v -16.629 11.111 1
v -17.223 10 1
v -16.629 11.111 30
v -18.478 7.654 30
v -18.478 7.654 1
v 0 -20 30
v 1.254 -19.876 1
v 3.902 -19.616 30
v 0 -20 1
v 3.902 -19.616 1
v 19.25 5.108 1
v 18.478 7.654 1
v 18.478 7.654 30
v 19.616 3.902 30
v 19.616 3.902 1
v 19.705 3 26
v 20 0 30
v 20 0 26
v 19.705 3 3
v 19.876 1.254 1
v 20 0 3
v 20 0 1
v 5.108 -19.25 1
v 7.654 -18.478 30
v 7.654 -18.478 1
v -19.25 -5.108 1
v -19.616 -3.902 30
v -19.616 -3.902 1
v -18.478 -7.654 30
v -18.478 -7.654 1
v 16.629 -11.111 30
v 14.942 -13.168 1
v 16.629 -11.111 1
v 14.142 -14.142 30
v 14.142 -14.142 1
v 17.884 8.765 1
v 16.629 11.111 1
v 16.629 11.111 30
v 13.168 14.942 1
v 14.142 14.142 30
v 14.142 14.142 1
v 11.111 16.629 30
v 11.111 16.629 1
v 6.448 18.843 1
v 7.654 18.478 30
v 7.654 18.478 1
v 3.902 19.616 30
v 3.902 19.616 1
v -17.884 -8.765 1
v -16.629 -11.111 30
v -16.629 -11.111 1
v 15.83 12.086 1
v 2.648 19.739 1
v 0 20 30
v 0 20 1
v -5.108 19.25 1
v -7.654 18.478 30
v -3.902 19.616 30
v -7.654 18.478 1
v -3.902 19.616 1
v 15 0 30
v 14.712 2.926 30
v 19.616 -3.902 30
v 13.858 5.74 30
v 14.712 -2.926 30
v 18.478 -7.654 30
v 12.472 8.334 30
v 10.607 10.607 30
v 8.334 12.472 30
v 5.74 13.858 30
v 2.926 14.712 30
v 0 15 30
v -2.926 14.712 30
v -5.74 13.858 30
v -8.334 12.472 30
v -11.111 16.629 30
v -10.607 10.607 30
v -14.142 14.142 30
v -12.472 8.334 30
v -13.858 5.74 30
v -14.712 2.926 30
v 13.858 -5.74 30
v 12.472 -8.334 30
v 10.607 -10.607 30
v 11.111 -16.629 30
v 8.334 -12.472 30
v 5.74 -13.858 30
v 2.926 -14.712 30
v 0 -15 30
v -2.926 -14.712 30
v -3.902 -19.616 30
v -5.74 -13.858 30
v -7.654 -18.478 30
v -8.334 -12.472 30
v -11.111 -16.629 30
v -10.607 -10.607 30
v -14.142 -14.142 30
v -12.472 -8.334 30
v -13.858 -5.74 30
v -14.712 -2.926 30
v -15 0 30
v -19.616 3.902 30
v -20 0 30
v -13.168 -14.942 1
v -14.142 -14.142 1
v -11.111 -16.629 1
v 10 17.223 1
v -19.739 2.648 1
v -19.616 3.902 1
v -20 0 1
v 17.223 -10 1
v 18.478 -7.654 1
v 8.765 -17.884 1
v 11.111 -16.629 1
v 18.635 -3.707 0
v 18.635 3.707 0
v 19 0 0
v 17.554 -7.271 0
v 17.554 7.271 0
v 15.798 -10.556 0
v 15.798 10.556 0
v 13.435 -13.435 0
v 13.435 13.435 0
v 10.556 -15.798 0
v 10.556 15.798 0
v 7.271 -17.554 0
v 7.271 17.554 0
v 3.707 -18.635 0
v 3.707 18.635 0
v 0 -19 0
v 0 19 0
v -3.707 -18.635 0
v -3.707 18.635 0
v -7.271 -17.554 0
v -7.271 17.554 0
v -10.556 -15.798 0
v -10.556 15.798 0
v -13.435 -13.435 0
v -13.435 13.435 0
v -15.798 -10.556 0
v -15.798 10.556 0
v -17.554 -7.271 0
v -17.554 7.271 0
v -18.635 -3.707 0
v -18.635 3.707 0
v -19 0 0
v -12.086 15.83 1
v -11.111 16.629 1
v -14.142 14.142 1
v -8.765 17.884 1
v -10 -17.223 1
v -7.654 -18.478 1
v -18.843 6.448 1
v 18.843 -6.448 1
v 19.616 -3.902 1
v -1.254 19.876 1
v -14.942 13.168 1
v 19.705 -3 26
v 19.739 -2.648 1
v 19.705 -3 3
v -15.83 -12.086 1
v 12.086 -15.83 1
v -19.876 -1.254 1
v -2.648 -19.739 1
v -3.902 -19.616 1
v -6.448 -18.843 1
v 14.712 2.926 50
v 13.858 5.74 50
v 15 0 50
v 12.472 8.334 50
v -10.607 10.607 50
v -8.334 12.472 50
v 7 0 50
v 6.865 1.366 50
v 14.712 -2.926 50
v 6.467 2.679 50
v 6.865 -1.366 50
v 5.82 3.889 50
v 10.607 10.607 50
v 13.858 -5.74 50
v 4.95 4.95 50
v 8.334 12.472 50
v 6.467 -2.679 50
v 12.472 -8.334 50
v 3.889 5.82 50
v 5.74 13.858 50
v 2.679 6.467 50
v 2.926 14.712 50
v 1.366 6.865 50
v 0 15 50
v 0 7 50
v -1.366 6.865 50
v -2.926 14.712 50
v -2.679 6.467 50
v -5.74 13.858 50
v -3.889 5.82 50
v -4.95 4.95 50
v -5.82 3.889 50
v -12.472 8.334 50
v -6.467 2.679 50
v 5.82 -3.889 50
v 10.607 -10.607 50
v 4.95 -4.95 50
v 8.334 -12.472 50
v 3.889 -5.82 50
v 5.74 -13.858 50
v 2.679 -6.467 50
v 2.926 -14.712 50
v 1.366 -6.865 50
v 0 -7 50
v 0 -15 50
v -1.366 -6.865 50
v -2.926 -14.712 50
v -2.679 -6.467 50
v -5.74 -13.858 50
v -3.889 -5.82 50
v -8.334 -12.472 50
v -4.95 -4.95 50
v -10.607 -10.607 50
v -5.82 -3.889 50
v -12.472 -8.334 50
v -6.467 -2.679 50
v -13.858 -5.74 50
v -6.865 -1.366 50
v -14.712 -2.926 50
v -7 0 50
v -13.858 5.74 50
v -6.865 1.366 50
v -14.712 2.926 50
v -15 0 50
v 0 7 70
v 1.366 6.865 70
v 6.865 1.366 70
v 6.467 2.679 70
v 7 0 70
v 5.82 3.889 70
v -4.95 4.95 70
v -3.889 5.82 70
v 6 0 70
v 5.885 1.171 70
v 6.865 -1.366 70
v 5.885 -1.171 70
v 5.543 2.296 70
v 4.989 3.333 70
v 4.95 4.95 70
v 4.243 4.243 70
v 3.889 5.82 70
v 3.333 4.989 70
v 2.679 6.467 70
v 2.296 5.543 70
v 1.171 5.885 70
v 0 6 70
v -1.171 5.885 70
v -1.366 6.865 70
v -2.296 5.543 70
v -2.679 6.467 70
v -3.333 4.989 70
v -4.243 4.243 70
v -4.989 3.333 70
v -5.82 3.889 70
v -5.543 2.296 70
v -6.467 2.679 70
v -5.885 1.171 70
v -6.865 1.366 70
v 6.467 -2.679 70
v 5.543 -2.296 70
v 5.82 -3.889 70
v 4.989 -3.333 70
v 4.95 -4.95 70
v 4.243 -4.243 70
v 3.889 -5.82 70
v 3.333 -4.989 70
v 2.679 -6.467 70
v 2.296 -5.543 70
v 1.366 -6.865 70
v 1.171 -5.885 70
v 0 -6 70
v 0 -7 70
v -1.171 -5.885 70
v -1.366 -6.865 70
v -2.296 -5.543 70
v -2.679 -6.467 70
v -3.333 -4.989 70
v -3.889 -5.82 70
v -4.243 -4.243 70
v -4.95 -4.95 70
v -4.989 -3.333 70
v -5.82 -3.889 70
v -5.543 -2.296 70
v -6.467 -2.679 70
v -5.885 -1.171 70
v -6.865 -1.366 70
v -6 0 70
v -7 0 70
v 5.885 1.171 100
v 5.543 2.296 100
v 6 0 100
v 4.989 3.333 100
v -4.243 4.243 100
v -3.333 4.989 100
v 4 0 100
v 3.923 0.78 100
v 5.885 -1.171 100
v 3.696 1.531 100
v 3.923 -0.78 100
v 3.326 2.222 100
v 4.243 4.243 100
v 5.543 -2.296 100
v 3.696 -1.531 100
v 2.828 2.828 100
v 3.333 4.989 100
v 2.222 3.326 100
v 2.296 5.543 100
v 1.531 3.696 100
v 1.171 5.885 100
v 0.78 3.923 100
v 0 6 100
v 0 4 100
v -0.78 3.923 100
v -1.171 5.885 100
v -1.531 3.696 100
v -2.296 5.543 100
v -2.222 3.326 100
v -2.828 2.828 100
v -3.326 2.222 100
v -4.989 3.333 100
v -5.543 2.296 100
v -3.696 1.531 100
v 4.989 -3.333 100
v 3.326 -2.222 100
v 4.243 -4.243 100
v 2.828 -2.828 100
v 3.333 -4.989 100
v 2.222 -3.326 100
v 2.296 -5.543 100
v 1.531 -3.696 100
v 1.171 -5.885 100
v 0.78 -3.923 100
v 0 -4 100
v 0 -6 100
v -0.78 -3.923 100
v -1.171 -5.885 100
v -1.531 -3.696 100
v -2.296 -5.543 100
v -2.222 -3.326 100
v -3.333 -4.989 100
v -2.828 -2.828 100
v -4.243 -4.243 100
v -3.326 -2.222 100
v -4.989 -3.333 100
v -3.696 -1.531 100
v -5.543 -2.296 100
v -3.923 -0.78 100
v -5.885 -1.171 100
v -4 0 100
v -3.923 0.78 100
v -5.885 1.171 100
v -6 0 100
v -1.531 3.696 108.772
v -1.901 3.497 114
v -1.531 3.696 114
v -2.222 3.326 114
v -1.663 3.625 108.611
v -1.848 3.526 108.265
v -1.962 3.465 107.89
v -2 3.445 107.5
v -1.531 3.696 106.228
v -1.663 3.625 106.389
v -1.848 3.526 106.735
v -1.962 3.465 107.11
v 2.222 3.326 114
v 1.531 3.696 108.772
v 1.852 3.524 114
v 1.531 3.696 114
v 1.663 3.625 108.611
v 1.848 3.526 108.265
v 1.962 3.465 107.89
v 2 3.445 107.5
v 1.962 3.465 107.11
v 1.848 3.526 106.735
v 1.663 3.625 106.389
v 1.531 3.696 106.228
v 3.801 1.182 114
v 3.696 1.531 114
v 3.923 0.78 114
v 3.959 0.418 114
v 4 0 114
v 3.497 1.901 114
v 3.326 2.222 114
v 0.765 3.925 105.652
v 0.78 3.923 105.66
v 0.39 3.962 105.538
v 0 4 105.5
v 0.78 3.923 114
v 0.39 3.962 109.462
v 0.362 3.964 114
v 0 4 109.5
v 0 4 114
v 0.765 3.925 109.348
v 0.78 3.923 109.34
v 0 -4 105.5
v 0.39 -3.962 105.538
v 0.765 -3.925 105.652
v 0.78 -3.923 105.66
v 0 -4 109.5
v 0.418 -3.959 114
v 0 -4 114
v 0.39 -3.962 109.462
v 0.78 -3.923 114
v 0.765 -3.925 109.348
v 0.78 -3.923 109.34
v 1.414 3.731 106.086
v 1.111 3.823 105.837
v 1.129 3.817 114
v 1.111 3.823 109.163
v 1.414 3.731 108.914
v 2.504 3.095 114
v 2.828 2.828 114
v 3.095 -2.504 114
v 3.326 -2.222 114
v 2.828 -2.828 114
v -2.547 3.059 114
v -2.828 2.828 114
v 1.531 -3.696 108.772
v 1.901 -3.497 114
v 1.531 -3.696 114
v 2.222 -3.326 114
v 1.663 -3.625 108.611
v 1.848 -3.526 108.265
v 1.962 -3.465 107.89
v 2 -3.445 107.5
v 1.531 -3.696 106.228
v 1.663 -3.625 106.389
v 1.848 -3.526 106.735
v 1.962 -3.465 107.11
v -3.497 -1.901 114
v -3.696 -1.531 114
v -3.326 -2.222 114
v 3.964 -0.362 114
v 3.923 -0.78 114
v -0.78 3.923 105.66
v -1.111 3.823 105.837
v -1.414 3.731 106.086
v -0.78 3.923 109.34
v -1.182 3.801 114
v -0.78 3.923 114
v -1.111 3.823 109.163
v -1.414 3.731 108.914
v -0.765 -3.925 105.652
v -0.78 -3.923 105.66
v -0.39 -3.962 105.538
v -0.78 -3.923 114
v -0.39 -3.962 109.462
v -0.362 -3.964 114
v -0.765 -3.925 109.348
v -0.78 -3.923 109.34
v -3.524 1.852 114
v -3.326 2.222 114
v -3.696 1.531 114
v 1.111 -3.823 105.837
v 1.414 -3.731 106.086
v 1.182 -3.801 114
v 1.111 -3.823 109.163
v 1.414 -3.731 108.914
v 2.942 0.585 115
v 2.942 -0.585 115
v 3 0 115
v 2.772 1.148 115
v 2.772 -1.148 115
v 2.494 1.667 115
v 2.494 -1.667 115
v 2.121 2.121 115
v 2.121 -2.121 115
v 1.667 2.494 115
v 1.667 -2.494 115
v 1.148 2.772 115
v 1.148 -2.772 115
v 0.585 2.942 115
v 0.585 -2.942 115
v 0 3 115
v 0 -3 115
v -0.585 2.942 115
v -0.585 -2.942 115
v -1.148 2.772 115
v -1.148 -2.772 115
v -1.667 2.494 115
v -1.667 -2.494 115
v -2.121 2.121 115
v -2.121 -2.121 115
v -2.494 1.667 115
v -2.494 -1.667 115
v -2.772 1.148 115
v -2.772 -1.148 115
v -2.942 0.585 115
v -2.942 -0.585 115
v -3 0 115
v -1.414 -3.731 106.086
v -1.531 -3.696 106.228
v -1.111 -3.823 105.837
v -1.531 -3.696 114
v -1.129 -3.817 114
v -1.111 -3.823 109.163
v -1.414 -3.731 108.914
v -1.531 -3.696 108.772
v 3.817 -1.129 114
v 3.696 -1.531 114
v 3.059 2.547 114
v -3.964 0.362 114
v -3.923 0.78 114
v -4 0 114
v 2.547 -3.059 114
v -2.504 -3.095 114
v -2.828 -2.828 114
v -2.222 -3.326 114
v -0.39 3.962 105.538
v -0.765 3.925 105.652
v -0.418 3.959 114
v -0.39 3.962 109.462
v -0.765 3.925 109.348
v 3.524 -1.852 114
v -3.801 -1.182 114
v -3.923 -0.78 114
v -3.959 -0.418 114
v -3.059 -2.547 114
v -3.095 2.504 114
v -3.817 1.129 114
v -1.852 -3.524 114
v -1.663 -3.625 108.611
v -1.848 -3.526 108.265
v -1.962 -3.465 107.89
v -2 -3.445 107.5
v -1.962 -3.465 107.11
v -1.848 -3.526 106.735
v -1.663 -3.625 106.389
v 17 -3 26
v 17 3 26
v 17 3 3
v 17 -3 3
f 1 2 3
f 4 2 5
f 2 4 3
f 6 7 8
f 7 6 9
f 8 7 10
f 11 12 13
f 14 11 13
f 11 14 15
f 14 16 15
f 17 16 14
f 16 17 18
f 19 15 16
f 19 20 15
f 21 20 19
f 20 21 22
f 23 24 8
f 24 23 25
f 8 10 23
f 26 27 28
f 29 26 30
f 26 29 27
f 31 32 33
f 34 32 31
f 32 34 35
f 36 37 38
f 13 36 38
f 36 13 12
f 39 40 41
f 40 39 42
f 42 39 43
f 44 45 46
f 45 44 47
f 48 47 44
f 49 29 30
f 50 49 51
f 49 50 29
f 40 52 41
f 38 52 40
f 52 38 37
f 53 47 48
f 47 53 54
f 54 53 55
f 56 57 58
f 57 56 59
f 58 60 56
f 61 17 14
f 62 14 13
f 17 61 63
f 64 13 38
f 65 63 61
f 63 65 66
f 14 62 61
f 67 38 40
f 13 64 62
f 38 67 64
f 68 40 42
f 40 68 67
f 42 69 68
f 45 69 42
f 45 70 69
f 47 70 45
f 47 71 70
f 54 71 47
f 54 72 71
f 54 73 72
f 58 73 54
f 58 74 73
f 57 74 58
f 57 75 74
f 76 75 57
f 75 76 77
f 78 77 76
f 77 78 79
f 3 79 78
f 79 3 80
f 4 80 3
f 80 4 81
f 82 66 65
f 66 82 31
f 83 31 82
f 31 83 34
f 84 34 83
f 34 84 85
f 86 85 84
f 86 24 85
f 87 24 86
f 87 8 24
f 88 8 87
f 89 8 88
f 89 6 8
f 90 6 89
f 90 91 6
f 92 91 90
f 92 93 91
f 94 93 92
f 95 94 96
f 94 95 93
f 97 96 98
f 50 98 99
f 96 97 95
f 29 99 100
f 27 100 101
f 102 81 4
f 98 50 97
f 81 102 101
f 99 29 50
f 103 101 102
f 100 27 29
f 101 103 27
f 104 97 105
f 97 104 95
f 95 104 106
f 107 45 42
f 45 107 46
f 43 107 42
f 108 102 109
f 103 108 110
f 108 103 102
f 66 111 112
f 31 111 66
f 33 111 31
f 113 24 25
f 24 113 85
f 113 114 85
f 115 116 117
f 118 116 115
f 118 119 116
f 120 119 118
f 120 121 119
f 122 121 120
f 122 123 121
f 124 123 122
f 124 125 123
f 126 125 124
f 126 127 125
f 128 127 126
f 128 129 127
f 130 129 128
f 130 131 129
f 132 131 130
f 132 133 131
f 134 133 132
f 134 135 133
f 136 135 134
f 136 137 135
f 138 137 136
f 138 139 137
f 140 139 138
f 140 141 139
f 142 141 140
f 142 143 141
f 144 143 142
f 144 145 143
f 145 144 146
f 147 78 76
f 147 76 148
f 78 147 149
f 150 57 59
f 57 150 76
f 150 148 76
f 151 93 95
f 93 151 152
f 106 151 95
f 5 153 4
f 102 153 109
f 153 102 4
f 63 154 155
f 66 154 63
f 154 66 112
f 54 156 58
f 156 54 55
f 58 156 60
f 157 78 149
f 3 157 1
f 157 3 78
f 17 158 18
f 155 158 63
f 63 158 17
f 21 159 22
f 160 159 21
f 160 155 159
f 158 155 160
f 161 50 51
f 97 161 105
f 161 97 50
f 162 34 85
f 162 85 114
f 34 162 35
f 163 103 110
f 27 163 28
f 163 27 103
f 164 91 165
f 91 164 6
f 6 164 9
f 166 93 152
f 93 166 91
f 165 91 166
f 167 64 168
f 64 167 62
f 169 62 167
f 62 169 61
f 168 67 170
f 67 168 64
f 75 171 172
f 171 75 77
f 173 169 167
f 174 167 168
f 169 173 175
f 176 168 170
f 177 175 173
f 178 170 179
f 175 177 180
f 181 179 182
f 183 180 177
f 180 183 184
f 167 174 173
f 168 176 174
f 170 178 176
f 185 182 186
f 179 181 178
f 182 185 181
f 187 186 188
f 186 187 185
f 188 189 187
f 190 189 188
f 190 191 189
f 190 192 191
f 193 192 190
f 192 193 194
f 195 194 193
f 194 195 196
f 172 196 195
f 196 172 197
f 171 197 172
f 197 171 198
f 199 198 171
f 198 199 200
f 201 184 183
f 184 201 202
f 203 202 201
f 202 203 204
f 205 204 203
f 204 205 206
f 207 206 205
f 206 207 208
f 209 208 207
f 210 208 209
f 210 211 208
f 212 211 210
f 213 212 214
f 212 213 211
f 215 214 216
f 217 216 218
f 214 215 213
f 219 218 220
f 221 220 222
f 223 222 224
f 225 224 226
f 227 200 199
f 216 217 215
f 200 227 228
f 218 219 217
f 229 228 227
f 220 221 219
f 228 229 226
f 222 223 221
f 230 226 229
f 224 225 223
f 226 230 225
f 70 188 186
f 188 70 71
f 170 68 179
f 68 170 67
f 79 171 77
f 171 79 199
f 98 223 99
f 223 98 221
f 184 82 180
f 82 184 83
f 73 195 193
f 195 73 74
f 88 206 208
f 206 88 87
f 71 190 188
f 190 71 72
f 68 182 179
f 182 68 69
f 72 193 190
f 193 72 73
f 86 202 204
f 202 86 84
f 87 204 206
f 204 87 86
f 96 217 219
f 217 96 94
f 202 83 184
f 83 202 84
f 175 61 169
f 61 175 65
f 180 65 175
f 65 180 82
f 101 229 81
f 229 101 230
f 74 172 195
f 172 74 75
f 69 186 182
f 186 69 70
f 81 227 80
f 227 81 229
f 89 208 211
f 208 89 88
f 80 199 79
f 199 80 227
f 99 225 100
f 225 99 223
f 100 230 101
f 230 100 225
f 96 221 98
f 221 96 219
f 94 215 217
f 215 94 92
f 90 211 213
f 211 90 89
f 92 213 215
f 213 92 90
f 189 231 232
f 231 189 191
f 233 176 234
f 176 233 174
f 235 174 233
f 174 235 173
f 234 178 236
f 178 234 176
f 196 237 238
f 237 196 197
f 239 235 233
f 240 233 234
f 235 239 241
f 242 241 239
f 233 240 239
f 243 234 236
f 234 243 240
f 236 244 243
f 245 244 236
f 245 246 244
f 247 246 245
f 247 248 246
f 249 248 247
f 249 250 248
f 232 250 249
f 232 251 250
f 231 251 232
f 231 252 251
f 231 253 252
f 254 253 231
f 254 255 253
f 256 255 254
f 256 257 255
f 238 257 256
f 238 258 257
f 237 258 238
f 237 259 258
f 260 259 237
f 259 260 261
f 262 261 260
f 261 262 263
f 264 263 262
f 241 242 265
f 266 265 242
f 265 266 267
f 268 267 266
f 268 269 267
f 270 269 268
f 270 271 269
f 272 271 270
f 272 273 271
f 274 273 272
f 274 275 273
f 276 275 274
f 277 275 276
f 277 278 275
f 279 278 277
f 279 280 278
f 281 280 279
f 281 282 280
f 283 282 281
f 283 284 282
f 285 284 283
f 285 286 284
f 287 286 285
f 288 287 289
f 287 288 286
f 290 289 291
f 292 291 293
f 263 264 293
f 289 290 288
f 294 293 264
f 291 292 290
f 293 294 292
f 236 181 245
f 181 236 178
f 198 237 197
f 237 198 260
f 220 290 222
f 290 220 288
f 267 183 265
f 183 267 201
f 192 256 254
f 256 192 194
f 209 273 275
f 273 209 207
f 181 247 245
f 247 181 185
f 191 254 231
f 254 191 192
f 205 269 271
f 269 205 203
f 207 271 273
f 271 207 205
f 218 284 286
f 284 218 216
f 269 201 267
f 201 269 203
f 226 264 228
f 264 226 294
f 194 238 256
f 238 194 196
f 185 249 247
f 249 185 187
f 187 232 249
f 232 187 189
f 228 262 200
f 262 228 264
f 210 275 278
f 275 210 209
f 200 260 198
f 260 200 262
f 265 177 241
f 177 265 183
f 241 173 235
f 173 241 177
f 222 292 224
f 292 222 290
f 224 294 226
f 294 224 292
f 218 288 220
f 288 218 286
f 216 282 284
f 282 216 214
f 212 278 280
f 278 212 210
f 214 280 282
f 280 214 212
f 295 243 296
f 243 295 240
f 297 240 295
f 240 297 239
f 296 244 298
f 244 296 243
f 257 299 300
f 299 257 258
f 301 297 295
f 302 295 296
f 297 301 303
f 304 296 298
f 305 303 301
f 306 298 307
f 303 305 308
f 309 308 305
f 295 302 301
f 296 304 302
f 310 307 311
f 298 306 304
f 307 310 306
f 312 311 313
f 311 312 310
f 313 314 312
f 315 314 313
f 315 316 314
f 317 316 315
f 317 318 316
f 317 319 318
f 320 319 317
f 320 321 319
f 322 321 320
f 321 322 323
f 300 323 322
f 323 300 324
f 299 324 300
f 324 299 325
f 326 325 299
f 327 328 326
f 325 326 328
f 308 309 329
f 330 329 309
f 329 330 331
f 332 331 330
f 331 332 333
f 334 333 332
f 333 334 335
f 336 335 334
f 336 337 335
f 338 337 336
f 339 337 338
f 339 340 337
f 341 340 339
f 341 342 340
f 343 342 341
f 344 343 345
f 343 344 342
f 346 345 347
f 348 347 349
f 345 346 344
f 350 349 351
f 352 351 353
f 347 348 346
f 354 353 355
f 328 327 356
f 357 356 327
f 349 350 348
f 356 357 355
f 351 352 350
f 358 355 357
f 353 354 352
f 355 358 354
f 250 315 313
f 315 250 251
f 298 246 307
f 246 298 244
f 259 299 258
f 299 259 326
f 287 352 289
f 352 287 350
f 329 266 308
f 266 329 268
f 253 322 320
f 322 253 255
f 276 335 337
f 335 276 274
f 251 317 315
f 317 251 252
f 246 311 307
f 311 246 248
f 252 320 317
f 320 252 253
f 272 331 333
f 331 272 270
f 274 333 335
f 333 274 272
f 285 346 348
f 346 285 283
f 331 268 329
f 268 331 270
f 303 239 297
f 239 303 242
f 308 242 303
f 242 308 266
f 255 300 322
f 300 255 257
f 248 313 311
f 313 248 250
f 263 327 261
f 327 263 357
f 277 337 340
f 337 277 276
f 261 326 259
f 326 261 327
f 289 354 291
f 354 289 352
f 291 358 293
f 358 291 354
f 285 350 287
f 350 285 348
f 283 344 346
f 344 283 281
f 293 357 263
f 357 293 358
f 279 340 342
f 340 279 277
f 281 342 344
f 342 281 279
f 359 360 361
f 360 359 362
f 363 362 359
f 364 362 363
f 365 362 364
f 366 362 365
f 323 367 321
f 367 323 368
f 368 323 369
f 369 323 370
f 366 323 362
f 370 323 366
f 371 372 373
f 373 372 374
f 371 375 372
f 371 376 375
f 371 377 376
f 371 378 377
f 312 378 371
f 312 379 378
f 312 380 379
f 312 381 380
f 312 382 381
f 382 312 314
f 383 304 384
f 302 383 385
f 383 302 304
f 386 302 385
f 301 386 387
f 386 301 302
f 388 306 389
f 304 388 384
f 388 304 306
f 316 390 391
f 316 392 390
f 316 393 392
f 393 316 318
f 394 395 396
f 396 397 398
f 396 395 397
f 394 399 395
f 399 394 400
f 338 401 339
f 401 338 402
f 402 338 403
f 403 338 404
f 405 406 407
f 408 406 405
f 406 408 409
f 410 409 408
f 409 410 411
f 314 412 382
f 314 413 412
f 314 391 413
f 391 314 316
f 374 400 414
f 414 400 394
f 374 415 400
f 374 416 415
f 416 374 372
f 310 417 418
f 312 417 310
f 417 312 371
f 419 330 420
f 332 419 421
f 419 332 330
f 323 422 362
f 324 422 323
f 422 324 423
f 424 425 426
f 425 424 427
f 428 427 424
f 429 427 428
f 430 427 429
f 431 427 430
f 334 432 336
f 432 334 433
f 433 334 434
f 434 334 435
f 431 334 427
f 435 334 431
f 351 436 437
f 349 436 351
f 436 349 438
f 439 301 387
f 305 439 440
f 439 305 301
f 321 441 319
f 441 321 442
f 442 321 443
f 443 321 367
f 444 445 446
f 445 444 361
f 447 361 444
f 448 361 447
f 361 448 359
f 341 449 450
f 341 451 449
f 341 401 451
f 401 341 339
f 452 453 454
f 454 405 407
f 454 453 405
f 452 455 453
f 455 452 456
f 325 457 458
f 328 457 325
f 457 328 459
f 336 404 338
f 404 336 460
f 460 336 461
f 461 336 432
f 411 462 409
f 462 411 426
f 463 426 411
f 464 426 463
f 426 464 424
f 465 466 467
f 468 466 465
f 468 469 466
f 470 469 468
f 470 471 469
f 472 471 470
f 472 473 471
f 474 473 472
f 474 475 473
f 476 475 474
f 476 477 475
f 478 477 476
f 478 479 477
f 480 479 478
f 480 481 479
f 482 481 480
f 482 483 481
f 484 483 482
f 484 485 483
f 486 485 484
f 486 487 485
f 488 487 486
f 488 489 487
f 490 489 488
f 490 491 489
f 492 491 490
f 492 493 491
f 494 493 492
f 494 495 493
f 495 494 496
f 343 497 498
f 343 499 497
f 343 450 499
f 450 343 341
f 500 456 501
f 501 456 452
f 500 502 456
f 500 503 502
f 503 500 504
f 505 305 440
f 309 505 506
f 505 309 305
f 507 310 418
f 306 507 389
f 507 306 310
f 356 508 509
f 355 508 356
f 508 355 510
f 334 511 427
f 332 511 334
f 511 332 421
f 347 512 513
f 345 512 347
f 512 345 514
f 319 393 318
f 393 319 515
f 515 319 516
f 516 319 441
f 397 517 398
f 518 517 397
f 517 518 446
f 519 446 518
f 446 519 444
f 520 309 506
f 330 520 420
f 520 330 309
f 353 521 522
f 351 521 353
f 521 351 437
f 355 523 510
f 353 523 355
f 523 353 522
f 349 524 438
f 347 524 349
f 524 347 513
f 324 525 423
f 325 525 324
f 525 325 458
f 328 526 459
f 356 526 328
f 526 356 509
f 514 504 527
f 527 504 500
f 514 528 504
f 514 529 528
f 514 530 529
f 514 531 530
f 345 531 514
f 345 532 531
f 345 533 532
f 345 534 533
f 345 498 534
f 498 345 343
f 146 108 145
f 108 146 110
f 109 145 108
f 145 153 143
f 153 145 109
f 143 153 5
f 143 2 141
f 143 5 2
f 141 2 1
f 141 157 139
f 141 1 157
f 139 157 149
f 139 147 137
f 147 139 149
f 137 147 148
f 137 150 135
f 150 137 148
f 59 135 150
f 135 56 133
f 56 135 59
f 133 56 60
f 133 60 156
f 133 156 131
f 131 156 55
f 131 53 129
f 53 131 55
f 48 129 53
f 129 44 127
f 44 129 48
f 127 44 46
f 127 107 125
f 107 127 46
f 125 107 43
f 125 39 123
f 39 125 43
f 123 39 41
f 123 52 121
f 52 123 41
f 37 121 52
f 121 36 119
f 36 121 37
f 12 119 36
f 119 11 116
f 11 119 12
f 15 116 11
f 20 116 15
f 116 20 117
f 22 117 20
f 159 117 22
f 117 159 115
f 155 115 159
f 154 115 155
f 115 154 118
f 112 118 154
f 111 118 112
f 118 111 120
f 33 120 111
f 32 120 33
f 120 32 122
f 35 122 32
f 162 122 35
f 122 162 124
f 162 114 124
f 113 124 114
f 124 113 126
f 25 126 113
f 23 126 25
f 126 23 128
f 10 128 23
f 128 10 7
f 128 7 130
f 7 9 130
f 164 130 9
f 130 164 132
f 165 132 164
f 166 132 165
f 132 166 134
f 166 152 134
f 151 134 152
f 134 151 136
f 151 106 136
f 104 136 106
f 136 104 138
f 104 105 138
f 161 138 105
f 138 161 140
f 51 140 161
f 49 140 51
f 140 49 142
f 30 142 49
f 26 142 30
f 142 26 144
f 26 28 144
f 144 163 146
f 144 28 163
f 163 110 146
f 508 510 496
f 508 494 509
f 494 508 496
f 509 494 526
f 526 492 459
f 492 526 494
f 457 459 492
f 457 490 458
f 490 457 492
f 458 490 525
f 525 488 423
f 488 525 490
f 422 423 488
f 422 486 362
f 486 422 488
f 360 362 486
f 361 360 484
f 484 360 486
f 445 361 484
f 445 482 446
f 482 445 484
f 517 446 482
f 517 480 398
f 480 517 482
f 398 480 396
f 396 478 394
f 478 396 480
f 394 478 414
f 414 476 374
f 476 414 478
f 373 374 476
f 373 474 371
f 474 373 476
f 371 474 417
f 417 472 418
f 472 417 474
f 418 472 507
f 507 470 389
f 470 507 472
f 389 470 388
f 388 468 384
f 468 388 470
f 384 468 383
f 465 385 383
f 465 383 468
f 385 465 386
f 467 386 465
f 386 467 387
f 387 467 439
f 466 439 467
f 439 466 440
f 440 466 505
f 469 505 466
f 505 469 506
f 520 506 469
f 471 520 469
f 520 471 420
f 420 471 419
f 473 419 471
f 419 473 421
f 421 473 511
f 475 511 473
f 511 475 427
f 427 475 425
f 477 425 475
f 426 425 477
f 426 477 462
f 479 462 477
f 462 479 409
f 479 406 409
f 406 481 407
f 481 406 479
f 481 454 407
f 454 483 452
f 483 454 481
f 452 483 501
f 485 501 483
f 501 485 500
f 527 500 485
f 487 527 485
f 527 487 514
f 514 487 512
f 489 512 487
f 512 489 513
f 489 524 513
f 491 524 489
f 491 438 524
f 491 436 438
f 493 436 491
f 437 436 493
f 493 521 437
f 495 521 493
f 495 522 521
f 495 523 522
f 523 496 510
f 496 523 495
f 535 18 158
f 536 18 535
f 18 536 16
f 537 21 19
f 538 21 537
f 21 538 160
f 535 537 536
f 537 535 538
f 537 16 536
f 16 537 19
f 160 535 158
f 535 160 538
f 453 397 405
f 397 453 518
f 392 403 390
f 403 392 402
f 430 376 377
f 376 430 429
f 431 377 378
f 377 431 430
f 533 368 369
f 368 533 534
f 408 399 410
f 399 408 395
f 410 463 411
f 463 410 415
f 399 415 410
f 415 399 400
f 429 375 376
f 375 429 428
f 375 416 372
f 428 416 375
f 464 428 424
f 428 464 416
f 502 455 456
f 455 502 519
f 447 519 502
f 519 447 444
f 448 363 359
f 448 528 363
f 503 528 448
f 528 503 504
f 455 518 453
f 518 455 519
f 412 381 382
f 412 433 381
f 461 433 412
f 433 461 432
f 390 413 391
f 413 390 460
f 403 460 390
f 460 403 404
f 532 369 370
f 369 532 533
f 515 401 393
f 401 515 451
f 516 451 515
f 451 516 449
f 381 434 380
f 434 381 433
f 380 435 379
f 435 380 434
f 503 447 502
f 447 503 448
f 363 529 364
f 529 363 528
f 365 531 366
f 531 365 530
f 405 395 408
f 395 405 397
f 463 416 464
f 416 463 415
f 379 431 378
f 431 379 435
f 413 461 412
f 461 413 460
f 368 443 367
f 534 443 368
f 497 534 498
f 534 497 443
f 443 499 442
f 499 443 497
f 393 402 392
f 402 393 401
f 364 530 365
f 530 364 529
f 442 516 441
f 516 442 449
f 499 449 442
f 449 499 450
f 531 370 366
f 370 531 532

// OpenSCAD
$fn = 32;

// ----------------------------------------------------------------------
// Stepped shaft: diameters 40, 30, 14, 12, 8 mm, 115 mm long
// ----------------------------------------------------------------------

// --- parameters (mm) ---
d1 = 40;                  // step 1 diameter
len1 = 30;                // step 1 length
d2 = 30;                  // step 2 diameter
len2 = 20;                // step 2 length
d3 = 14;                  // step 3 diameter
len3 = 20;                // step 3 length
d4 = 12;                  // step 4 diameter
len4 = 30;                // step 4 length
d5 = 8;                   // step 5 diameter
len5 = 15;                // step 5 length
total = 115;              // overall length
chamfer = 1;              // end chamfer
key_w = 6;                // keyway width
key_d = 3;                // keyway depth
key_len = 23;             // keyway length
key_z = 3;                // keyway start along the shaft
cross_d = 4;              // cross pin hole
cross_z = 107.5;          // cross hole position

difference() {
  /* turned body: stacked cylinders, every step sunk into the bigger one */
  union() {
    cylinder(h = len1, d = d1);
    translate([0, 0, 29.6]) cylinder(h = 20.4, d = d2);
    translate([0, 0, 49.6]) cylinder(h = 20.4, d = d3);
    translate([0, 0, 69.6]) cylinder(h = 30.4, d = d4);
    translate([0, 0, 99.6]) cylinder(h = 15.4, d = d5);
  }
  /* bottom chamfer ring cut */
  rotate_extrude() translate([19, -2.5]) polygon([[0, 0], [3.5, 0], [3.5, 6], [0, 2.5]]);
  /* top chamfer ring cut */
  rotate_extrude() translate([3, 115]) polygon([[0, 0], [3.5, -3.5], [3.5, 2.5], [0, 2.5]]);
  /* keyway milled along the first step */
  translate([d1 / 2 - key_d, -key_w / 2, key_z]) cube([key_d + 2.5, key_w, key_len]);
  /* cross pin hole through the small step */
  translate([0, 0, cross_z]) rotate([90, 0, 0]) cylinder(h = d5 + 5, d = cross_d, center = true);
}
